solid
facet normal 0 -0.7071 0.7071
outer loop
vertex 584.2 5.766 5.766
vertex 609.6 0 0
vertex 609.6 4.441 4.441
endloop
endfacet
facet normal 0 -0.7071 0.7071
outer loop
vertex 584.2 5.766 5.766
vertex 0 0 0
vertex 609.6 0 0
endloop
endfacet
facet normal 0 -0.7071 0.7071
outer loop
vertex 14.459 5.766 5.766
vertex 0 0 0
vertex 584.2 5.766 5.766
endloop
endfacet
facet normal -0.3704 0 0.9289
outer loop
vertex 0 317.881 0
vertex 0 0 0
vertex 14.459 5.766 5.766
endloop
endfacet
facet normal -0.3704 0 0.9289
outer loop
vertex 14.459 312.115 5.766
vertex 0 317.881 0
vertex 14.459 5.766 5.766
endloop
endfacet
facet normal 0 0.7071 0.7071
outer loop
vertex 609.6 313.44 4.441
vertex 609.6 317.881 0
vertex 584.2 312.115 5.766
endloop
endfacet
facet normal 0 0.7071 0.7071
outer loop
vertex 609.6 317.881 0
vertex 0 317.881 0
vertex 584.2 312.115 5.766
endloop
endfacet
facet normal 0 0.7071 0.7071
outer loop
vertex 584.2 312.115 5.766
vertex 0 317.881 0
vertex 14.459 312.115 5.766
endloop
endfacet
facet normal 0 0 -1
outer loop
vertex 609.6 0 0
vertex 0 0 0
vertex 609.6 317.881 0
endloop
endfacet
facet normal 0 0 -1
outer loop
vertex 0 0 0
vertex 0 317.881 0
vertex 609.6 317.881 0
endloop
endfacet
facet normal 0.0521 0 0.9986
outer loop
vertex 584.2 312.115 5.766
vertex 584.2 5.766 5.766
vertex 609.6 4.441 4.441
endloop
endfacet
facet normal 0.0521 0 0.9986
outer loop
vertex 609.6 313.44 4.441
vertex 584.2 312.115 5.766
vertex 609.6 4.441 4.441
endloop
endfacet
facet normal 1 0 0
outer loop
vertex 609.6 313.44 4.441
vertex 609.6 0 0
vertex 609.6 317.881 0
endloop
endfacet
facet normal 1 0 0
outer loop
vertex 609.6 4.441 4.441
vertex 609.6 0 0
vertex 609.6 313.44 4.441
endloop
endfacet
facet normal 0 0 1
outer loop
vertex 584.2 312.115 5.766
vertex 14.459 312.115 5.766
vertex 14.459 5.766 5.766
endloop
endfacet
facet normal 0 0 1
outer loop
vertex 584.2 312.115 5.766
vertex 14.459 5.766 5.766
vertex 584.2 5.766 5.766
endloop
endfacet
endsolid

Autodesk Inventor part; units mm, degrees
ref_plane "YZ Plane" through (0, 0, 0) normal (1, 0, 0) x (0, 1, 0)
ref_plane "XY Plane" through (0, 0, 0) normal (0, 0, 1) x (1, 0, 0)
sketch "Sketch1" plane through (0, 0, 0) normal (0, 0, 1) x (1, 0, 0)
  line L0 (0, 0) -> (609.6, 0)
  line L1 (609.6, 0) -> (609.6, 317.881)
  line L2 (609.6, 317.881) -> (0, 317.881)
  line L3 (0, 317.881) -> (0, 0)
  dimension "d0" = 609.6
  dimension "d1" = 317.881
extrude "Extrusion1" add sketch "Sketch1" along normal blind 5.7658
sketch "Sketch2" plane through (0, 317.881, 0) normal (0, 1, 0) x (1, 0, 0)
  line L0 (609.6, 0) -> (0, 0) projected
  line L1 (0, 0) -> (0, -5.7658) projected
  line L2 (609.6, -5.7658) -> (0, -5.7658) projected
  line L3 (609.6, 0) -> (609.6, -5.7658) projected
  line L4 (0, 0) -> (609.6, 0) projected
  line L5 (0, 0) -> (14.4594, -5.7658)
  line L6 (0, -5.7658) -> (609.6, -5.7658) projected
  line L7 (14.4594, -5.7658) -> (14.4594, 0)
  line L8 (14.4594, -5.7658) -> (20.2252, -5.7658) construction
  dimension "d4" = 21.74
  dimension "d5" = 90
extrude "Extrusion2" cut sketch "Sketch2" against normal through all contours L5 L2 L1
sketch "Sketch3" plane through (609.6, 0, 0) normal (1, 0, 0) x (0, 0, -1)
  line L0 (0, 0) -> (0, 317.881) projected
  line L1 (0, 317.881) -> (-5.7658, 317.881) projected
  line L2 (-5.7658, 0) -> (-5.7658, 317.881) projected
  line L3 (0, 0) -> (-5.7658, 0) projected
  line L4 (0, 0) -> (-5.7658, 0) projected
  line L5 (0, 0) -> (-5.7658, 5.7658)
  line L6 (-5.7658, 0) -> (-5.7658, 317.881) projected
  line L7 (0, 0) -> (8.1541, 0) construction
  line L8 (0, 317.881) -> (-5.7658, 317.881) projected
  line L9 (0, 317.881) -> (-5.7658, 312.1152)
  line L10 (0, 317.881) -> (8.1541, 317.881) construction
  dimension "d8" = 135
  dimension "d9" = 135
extrude "Extrusion3" cut sketch "Sketch3" against normal through all contours L3 L2 L5 | L9 L2 L1
ref_plane "Work Plane1" through (0, 158.9405, 0) normal (0, 1, 0) x (-1, 0, 0)
sketch "Sketch4" plane through (0, 158.9405, 0) normal (0, 1, 0) x (-1, 0, 0)
  line L0 (-14.4594, 5.7658) -> (0, 0) projected
  line L1 (-609.6, 5.7658) -> (-14.4594, 5.7658) projected
  line L2 (-609.6, 0) -> (-609.6, 5.7658) projected
  line L3 (-609.6, 0) -> (0, 0) projected
  line L4 (-609.6, 5.7658) -> (-584.2, 5.7658) construction
  line L5 (-584.2, 5.7658) -> (-609.6, 4.4413)
  point P0 (0, 0)
  dimension "d13" = 25.4
  dimension "d14" = 2.985
extrude "Extrusion4" cut sketch "Sketch4" against normal through all both and the other way through all contours L5 L2 L1
properties part number "Wind Tunnel Test Section Back" material "Polycarbonate, Clear"
